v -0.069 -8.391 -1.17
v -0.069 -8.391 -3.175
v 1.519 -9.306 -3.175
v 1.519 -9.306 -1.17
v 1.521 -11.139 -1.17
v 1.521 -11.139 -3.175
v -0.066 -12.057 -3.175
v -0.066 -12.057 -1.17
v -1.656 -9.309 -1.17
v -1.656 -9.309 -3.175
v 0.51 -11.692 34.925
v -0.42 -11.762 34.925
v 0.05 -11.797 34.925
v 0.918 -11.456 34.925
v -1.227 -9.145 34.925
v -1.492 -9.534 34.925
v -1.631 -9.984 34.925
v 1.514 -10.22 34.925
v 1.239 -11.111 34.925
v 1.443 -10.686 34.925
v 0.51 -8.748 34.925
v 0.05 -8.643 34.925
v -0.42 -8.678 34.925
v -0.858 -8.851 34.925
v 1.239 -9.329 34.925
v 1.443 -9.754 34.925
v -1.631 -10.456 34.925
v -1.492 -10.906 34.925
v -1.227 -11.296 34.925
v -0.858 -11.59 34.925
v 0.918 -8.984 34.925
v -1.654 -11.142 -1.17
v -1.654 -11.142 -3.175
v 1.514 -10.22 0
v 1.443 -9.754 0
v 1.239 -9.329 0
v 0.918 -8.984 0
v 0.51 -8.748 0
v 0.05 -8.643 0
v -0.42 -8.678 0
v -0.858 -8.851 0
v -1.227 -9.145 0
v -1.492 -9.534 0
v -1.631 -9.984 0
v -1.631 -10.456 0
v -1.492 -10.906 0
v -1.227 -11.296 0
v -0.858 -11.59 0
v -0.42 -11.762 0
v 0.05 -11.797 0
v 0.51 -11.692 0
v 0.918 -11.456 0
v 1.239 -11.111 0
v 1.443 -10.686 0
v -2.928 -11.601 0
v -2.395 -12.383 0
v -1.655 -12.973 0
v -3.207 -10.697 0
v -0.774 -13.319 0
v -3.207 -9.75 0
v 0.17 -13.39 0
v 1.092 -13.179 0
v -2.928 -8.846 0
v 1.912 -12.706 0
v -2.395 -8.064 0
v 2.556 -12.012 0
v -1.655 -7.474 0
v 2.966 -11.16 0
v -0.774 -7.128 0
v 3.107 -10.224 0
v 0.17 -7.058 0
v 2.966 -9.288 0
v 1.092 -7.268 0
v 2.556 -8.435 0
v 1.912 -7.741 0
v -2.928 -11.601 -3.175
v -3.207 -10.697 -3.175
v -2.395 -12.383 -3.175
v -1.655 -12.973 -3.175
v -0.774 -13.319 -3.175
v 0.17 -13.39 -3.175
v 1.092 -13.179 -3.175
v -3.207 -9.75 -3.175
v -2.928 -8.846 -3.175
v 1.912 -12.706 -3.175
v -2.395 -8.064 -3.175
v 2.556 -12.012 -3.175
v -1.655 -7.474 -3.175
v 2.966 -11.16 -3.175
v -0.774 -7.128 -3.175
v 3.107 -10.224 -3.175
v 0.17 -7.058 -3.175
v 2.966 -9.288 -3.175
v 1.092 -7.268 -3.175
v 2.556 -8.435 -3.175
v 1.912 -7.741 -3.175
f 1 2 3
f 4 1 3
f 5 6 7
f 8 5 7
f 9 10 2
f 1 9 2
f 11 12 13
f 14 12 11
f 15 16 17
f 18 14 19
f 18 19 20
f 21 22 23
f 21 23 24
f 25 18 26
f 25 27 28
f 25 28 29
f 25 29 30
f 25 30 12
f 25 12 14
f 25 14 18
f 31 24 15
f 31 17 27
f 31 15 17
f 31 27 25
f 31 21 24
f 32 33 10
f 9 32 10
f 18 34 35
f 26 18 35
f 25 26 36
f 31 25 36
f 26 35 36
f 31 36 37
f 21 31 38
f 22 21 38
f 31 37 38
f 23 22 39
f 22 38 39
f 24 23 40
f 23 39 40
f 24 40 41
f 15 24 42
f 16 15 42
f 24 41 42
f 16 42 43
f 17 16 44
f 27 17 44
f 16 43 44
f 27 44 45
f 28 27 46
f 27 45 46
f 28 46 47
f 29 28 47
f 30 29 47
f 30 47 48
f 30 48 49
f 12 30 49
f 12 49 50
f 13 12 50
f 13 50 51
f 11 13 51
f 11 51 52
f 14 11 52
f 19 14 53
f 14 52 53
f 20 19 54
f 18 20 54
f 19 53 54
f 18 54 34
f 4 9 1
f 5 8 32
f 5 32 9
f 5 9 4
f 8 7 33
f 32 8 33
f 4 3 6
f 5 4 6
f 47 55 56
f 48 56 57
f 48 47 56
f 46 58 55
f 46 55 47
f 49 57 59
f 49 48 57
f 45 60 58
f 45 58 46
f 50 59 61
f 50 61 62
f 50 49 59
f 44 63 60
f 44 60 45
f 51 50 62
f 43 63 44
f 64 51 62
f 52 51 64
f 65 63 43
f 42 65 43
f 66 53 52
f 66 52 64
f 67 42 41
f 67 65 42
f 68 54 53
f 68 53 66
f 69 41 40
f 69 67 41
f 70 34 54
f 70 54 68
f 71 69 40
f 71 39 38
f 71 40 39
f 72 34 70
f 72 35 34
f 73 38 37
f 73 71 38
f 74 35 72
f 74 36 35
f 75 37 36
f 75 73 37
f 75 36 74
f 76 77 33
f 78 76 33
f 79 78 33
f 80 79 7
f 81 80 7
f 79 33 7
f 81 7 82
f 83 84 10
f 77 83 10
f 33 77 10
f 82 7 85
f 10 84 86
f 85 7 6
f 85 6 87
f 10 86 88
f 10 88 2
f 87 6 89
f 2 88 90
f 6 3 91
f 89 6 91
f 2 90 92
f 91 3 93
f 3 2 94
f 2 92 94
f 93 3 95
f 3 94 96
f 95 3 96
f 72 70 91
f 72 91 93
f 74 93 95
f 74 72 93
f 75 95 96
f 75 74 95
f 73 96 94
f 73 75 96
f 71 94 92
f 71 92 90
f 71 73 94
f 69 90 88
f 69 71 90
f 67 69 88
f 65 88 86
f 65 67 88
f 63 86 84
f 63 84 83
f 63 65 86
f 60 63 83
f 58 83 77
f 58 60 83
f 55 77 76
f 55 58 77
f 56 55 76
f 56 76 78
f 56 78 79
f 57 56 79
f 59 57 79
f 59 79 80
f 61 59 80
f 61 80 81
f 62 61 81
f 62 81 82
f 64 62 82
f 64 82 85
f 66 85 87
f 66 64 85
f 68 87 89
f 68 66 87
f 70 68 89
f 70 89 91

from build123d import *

# Parameters (mm, degrees)
F1_R     = 1.5812951981
F2_DEPTH = 34.925
F0_R     = 3.175
F3_DEPTH = 3.175
F5_DEPTH = 2.0052631579


# Not quite as in the source:
# - a length typed as a fraction of an inch, garbled in the dataset ("3 / 203.2 mm" for 3/8 in), is restored


with BuildPart() as f2:
    # F1 (on face) → F2 (new body)
    with BuildSketch(Plane.XY):
        with Locations((-0.0677817225, -10.2201197296)):
            Circle(F1_R)
    extrude(amount=F2_DEPTH)

    # F0 (on Top) → F3 (join)
    with BuildSketch(Plane.XY):
        with Locations((-0.0676529453, -10.2237053216)):
            Circle(F0_R)
    extrude(amount=-F3_DEPTH)

    # F4 (on face) → F5 (cut)
    with BuildSketch(Plane(origin=(0, 0, -3.175), x_dir=(1, 0, 0), z_dir=(0, 0, -1))):
        Polygon((-0.0660723406, 12.0567917448), (-1.6543620528, 11.141617377), (-1.6559426575, 9.3085309538), (-0.06923355, 8.3906188983), (1.5190561622, 9.3057932661), (1.5206367669, 11.1388796893), align=None)
    extrude(amount=-F5_DEPTH, mode=Mode.SUBTRACT)


solid = f2.part
